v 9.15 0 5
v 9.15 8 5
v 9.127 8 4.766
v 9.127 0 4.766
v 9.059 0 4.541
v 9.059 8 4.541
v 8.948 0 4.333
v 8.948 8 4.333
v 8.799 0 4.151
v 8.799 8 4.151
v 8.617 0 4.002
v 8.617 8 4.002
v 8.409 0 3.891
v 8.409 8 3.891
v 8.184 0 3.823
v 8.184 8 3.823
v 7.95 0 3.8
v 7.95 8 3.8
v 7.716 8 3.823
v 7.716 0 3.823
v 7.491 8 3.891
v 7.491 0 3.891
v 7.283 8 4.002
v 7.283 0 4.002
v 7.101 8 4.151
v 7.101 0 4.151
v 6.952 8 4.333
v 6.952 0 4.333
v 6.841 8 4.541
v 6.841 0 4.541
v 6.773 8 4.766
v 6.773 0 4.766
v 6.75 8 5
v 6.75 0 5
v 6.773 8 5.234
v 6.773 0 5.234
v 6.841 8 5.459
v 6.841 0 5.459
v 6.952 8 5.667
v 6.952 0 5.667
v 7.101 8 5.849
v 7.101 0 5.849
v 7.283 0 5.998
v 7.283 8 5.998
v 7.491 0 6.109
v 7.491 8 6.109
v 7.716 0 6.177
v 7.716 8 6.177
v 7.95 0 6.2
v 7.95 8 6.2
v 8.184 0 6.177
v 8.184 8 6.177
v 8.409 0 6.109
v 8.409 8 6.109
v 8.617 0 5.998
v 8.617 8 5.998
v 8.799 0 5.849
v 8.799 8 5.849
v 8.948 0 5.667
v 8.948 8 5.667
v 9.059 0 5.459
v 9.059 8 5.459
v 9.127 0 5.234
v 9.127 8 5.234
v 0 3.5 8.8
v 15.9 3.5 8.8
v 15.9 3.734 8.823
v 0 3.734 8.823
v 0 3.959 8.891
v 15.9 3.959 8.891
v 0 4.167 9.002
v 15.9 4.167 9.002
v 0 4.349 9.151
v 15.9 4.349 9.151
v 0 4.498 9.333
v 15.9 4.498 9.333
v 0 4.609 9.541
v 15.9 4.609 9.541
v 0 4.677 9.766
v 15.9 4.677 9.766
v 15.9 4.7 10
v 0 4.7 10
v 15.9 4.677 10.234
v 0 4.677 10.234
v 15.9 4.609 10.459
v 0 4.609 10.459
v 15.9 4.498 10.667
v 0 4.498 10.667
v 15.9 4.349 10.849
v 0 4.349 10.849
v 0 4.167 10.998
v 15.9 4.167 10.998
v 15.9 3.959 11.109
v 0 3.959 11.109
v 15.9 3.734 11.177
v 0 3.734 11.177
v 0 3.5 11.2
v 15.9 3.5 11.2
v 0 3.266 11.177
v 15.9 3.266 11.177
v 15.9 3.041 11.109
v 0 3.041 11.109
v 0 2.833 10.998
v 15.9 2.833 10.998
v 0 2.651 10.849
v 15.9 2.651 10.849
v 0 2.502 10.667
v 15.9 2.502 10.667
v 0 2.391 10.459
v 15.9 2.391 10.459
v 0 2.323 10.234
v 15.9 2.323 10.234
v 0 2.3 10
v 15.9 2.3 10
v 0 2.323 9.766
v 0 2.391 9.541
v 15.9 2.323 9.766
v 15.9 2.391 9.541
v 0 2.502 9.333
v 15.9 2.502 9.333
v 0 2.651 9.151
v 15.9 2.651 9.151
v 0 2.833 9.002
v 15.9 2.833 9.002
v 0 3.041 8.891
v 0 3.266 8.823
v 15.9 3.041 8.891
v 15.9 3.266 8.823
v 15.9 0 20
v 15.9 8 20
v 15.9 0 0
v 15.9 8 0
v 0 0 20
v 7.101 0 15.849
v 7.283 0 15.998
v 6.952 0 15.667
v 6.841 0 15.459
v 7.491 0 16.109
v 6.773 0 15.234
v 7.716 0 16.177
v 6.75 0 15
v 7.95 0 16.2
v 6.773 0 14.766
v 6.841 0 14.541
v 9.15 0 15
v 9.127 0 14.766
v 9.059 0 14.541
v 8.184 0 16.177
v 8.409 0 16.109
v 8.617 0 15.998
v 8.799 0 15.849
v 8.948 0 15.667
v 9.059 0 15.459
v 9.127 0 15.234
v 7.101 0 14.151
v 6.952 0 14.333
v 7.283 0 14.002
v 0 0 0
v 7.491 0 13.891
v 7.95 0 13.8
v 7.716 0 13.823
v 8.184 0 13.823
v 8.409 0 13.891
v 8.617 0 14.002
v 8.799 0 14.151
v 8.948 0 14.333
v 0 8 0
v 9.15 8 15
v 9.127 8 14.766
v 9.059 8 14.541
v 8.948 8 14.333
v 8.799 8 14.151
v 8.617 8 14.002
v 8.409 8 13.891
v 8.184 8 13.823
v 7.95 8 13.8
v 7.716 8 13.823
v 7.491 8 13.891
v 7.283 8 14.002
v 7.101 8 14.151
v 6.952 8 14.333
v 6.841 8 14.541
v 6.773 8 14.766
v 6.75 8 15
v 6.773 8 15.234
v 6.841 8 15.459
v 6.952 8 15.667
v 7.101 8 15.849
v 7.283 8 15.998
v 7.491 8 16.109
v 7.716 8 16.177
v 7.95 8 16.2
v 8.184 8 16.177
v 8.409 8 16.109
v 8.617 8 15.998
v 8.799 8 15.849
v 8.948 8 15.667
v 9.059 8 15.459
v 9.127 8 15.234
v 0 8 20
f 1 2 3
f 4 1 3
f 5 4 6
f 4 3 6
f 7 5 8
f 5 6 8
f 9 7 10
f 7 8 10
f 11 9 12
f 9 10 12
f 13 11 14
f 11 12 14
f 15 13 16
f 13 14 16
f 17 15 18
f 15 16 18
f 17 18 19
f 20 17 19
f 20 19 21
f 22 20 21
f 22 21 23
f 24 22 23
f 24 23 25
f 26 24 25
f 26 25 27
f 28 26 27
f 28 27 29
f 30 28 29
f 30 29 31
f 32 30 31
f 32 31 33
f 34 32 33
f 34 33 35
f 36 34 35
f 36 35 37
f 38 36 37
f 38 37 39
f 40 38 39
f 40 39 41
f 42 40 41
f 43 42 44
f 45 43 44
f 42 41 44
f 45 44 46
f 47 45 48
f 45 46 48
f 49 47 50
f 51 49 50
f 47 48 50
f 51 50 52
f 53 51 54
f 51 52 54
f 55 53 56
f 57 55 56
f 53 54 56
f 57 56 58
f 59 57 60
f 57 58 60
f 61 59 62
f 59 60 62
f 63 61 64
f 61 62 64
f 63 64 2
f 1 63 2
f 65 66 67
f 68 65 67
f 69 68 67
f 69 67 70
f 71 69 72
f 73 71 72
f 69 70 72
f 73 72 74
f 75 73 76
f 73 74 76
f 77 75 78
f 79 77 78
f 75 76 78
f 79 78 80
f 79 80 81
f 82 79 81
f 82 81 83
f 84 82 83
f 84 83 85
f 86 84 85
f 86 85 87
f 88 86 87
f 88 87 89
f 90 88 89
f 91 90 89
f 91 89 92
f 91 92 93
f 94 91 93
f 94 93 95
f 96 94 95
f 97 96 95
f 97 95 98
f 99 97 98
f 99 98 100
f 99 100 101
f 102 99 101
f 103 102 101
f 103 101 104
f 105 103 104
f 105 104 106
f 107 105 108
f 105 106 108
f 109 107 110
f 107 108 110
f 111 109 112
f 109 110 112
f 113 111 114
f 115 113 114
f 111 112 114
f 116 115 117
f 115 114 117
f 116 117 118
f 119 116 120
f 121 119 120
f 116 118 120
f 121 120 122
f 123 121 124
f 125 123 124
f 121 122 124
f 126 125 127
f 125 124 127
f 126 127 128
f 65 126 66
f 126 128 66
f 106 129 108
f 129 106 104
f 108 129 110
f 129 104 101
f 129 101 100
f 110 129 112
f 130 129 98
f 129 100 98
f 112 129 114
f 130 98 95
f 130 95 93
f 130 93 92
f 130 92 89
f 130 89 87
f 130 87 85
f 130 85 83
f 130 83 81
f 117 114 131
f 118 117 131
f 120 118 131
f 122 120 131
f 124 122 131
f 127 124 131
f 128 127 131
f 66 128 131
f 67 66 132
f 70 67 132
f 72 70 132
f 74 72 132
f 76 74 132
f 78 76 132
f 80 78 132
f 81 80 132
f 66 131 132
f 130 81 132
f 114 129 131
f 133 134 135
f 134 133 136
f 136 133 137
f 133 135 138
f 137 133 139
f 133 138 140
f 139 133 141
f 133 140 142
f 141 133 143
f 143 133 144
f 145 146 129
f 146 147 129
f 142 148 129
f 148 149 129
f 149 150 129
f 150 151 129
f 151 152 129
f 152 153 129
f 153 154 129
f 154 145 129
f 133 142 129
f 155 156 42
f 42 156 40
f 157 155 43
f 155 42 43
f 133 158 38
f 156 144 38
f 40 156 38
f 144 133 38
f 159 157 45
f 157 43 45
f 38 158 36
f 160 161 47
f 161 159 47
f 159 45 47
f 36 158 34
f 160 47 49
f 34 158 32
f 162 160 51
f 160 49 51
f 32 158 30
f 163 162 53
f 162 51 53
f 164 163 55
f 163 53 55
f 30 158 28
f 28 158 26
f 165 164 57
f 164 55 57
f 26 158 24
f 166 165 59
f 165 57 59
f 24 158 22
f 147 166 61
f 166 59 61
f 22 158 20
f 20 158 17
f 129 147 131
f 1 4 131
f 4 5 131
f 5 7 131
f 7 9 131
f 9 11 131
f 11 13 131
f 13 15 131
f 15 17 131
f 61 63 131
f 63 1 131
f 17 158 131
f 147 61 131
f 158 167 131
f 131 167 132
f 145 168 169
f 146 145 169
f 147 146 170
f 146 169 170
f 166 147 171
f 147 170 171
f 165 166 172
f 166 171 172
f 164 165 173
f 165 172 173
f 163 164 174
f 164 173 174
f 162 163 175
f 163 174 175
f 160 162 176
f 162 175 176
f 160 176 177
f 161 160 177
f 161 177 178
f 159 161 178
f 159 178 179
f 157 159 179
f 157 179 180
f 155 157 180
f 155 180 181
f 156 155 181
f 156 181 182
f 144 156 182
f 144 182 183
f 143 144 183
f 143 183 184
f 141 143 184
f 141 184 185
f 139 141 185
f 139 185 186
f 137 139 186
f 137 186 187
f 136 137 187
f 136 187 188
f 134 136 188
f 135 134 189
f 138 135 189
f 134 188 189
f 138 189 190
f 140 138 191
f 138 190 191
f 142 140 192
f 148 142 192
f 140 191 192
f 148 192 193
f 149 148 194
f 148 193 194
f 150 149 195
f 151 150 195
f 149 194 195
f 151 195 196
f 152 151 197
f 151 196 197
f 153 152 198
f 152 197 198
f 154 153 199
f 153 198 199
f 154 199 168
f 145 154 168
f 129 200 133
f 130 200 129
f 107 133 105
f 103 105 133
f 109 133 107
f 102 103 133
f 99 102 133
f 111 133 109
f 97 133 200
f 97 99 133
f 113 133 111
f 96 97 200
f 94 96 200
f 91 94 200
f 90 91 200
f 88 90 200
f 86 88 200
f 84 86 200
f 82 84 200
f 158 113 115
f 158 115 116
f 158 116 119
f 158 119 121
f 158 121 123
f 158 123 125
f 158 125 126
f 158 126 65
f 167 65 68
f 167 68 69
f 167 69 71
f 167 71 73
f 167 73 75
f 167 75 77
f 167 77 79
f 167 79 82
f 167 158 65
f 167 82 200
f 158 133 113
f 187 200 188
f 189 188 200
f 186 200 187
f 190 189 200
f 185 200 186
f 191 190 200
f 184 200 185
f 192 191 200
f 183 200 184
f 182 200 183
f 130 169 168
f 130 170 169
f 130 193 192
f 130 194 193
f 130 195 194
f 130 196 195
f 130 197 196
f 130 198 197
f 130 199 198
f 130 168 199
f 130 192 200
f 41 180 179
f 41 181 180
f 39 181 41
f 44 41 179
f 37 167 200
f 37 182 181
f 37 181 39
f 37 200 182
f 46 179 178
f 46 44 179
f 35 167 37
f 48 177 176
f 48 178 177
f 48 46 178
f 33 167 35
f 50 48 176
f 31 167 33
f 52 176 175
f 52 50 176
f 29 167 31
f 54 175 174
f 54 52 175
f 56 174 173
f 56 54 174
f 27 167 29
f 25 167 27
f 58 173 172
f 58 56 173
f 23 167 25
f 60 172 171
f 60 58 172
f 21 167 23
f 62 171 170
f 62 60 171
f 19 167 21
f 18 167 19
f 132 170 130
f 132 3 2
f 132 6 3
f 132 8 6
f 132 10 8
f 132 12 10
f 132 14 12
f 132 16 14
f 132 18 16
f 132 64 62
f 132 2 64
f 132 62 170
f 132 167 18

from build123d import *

# Parameters (mm, degrees)
SKETCH1_W           = 15.9
SKETCH1_H           = 8
BOSS_EXTRUDE1_DEPTH = 20
SKETCH2_R           = 1.2
CUT_EXTRUDE1_DEPTH  = 16.9
SKETCH3_R           = 1.2
CUT_EXTRUDE2_DEPTH  = 9


with BuildPart() as part:
    # Sketch1 → Boss-Extrude1 (new body)
    with BuildSketch(Plane.XY):
        with Locations((7.95, 4)):
            Rectangle(SKETCH1_W, SKETCH1_H)
    extrude(amount=BOSS_EXTRUDE1_DEPTH)

    # Sketch2 → Cut-Extrude1 (cut, through all)
    with BuildSketch(Plane(origin=(15.9, 0, 0), x_dir=(0, 0, -1), z_dir=(1, 0, 0))):
        with Locations((-10, 3.5)):
            Circle(SKETCH2_R)
    extrude(amount=-CUT_EXTRUDE1_DEPTH, mode=Mode.SUBTRACT)

    # Sketch3 → Cut-Extrude2 (cut, through all)
    with BuildSketch(Plane(origin=(0, 8, 0), x_dir=(1, 0, 0), z_dir=(0, 1, 0))):
        with Locations((7.95, -15)):
            Circle(SKETCH3_R)
        with Locations((7.95, -5)):
            Circle(SKETCH3_R)
    extrude(amount=-CUT_EXTRUDE2_DEPTH, mode=Mode.SUBTRACT)


solid = part.part
